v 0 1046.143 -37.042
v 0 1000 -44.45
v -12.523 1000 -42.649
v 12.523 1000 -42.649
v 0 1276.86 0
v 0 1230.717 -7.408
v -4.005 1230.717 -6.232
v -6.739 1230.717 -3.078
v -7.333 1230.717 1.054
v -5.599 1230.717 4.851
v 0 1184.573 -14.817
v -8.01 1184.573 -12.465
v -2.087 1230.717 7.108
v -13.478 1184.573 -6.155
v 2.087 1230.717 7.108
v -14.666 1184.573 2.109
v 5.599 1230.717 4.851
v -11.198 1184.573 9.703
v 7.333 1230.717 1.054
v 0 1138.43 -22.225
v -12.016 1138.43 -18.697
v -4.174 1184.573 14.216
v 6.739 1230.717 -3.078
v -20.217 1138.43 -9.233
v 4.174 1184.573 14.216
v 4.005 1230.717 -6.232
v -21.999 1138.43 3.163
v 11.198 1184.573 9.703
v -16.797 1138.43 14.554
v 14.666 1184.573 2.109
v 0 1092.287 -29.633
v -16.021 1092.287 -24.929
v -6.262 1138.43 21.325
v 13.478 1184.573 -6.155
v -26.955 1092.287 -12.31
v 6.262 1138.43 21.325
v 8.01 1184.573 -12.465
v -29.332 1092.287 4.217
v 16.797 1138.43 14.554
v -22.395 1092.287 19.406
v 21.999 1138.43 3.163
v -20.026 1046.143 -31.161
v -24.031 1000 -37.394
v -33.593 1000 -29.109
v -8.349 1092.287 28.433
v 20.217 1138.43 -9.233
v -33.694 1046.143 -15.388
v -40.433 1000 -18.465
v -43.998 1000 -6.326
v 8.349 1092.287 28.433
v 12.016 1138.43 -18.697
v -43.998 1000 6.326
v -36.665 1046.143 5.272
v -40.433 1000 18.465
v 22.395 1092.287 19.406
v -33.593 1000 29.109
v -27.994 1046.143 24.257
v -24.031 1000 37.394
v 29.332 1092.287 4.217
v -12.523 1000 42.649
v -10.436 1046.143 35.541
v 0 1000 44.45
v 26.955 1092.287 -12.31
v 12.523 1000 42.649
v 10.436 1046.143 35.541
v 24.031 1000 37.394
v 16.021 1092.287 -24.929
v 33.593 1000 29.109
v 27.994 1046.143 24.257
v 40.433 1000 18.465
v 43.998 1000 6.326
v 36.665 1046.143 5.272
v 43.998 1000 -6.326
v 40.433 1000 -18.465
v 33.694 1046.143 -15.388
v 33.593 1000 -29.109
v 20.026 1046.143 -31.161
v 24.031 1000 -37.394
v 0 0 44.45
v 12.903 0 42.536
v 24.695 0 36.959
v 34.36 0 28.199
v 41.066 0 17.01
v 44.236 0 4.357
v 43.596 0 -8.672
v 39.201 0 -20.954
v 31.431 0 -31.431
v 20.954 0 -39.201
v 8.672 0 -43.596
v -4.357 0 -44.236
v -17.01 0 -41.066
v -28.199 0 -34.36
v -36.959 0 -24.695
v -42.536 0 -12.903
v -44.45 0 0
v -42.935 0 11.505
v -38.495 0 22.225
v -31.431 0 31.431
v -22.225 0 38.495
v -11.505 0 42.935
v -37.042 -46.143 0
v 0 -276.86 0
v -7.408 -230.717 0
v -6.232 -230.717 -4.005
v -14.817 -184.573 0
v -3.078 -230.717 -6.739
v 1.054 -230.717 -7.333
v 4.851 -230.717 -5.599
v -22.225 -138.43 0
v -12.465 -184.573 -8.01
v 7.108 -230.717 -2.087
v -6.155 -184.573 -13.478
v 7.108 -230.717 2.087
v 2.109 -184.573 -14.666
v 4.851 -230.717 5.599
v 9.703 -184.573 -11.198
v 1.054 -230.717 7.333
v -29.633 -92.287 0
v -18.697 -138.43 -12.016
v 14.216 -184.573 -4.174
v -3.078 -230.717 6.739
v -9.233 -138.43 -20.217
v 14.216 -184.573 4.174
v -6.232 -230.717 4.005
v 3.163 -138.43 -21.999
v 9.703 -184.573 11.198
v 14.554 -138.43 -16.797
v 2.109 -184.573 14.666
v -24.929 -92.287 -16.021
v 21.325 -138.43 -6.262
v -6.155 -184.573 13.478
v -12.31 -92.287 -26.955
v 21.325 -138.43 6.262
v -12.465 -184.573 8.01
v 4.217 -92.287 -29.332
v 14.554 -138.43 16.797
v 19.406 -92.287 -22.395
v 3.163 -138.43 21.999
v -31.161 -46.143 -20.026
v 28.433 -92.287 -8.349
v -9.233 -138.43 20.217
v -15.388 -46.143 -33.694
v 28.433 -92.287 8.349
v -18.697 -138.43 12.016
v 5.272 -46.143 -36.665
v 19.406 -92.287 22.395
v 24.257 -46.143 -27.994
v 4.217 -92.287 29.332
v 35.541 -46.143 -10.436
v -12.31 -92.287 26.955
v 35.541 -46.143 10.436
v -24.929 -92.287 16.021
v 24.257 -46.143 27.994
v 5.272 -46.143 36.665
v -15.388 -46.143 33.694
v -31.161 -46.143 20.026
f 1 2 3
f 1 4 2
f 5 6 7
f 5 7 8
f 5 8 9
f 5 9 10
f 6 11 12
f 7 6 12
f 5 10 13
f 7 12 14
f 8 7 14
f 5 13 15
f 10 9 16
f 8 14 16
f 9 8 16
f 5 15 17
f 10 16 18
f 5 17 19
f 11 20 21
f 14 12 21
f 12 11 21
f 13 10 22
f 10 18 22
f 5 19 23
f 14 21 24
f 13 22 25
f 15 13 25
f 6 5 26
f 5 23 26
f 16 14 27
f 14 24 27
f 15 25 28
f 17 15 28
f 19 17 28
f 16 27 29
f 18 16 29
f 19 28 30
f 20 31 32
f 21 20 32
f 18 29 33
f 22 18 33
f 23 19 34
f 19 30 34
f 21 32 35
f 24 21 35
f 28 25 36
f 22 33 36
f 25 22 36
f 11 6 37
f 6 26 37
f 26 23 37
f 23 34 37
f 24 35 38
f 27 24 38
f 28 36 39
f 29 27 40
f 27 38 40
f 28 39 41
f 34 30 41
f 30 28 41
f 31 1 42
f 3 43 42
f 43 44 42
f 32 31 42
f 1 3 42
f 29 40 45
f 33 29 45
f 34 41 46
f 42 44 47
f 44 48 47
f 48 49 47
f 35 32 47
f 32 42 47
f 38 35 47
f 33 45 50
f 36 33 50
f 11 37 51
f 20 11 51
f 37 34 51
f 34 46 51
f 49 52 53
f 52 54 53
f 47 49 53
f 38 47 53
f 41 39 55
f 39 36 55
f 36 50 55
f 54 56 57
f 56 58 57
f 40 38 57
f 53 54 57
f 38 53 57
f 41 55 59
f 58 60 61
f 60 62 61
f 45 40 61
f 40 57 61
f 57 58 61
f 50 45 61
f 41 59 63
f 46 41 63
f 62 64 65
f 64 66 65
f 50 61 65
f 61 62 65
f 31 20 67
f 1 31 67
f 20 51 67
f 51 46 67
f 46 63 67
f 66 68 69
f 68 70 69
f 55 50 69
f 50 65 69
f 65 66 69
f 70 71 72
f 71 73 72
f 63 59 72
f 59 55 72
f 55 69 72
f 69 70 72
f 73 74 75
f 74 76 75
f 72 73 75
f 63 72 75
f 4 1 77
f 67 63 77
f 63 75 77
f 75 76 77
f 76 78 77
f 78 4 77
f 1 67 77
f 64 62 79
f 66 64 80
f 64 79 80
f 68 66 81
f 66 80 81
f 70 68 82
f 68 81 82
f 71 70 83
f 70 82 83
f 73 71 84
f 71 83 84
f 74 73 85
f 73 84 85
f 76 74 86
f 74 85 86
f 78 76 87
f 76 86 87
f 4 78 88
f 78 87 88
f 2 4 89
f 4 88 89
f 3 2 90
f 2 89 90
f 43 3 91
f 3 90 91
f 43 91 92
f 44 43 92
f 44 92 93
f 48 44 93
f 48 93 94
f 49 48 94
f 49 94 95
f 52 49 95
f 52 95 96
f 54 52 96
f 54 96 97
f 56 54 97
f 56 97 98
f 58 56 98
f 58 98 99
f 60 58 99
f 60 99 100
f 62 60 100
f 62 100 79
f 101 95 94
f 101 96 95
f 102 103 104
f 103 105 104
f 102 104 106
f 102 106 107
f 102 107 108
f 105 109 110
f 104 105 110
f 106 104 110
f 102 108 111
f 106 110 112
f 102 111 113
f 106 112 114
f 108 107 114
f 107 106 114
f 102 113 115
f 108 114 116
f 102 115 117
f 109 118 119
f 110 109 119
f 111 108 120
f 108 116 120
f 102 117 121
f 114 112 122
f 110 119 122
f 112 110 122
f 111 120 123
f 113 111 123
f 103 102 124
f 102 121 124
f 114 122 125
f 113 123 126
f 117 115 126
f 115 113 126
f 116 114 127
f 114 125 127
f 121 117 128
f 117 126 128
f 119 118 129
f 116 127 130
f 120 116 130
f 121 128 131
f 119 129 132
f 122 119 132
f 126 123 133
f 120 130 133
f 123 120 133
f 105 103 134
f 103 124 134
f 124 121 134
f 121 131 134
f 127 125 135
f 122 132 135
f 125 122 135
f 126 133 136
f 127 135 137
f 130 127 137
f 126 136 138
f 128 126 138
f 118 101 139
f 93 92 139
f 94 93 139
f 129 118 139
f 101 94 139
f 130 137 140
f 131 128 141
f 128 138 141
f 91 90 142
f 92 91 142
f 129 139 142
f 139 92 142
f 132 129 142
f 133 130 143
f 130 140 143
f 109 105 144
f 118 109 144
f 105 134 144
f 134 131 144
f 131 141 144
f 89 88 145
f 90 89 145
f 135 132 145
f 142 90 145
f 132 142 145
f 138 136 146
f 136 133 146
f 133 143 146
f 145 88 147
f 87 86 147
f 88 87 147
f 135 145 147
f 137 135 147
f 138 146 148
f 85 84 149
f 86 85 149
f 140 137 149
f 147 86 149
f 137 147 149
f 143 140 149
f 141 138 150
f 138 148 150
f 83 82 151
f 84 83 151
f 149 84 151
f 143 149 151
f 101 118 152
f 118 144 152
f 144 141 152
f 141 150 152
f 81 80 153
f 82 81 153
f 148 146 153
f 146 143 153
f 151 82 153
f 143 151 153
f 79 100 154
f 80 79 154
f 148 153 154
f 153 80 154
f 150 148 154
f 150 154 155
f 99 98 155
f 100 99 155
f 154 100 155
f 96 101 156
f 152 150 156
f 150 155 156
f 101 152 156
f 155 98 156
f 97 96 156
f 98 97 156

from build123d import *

# Parameters (mm, degrees)
SKETCH1_R           = 44.45
BOSS_EXTRUDE1_DEPTH = 1000


with BuildPart() as part:
    # Sketch1 → Boss-Extrude1 (new body)
    with BuildSketch(Plane(origin=(0, 0, 0), x_dir=(1, 0, 0), z_dir=(0, 1, 0))):
        with Locations(Location((0, 0, 0), (0, 0, 270))):
            Circle(SKETCH1_R)
    extrude(amount=BOSS_EXTRUDE1_DEPTH)

    # Sketch3 → Revolve3 (revolve)
    with BuildSketch(Plane.XY, mode=Mode.PRIVATE) as revolve3_sk:
        Polygon((0, 1000), (0, 1276.86), (-44.45, 1000), align=None)
    revolve(revolve3_sk.sketch.rotate(Axis((0, 1000, 0), (0, 1, 0)), 270), axis=Axis((0, 1000, 0), (0, 1, 0)))

    # Sketch4 → Revolve4 (revolve)
    with BuildSketch(Plane.XY):
        Polygon((0, 0), (0, -276.86), (-44.45, 0), align=None)
    revolve(axis=Axis((0, 0, 0), (0, -1, 0)))


solid = part.part
